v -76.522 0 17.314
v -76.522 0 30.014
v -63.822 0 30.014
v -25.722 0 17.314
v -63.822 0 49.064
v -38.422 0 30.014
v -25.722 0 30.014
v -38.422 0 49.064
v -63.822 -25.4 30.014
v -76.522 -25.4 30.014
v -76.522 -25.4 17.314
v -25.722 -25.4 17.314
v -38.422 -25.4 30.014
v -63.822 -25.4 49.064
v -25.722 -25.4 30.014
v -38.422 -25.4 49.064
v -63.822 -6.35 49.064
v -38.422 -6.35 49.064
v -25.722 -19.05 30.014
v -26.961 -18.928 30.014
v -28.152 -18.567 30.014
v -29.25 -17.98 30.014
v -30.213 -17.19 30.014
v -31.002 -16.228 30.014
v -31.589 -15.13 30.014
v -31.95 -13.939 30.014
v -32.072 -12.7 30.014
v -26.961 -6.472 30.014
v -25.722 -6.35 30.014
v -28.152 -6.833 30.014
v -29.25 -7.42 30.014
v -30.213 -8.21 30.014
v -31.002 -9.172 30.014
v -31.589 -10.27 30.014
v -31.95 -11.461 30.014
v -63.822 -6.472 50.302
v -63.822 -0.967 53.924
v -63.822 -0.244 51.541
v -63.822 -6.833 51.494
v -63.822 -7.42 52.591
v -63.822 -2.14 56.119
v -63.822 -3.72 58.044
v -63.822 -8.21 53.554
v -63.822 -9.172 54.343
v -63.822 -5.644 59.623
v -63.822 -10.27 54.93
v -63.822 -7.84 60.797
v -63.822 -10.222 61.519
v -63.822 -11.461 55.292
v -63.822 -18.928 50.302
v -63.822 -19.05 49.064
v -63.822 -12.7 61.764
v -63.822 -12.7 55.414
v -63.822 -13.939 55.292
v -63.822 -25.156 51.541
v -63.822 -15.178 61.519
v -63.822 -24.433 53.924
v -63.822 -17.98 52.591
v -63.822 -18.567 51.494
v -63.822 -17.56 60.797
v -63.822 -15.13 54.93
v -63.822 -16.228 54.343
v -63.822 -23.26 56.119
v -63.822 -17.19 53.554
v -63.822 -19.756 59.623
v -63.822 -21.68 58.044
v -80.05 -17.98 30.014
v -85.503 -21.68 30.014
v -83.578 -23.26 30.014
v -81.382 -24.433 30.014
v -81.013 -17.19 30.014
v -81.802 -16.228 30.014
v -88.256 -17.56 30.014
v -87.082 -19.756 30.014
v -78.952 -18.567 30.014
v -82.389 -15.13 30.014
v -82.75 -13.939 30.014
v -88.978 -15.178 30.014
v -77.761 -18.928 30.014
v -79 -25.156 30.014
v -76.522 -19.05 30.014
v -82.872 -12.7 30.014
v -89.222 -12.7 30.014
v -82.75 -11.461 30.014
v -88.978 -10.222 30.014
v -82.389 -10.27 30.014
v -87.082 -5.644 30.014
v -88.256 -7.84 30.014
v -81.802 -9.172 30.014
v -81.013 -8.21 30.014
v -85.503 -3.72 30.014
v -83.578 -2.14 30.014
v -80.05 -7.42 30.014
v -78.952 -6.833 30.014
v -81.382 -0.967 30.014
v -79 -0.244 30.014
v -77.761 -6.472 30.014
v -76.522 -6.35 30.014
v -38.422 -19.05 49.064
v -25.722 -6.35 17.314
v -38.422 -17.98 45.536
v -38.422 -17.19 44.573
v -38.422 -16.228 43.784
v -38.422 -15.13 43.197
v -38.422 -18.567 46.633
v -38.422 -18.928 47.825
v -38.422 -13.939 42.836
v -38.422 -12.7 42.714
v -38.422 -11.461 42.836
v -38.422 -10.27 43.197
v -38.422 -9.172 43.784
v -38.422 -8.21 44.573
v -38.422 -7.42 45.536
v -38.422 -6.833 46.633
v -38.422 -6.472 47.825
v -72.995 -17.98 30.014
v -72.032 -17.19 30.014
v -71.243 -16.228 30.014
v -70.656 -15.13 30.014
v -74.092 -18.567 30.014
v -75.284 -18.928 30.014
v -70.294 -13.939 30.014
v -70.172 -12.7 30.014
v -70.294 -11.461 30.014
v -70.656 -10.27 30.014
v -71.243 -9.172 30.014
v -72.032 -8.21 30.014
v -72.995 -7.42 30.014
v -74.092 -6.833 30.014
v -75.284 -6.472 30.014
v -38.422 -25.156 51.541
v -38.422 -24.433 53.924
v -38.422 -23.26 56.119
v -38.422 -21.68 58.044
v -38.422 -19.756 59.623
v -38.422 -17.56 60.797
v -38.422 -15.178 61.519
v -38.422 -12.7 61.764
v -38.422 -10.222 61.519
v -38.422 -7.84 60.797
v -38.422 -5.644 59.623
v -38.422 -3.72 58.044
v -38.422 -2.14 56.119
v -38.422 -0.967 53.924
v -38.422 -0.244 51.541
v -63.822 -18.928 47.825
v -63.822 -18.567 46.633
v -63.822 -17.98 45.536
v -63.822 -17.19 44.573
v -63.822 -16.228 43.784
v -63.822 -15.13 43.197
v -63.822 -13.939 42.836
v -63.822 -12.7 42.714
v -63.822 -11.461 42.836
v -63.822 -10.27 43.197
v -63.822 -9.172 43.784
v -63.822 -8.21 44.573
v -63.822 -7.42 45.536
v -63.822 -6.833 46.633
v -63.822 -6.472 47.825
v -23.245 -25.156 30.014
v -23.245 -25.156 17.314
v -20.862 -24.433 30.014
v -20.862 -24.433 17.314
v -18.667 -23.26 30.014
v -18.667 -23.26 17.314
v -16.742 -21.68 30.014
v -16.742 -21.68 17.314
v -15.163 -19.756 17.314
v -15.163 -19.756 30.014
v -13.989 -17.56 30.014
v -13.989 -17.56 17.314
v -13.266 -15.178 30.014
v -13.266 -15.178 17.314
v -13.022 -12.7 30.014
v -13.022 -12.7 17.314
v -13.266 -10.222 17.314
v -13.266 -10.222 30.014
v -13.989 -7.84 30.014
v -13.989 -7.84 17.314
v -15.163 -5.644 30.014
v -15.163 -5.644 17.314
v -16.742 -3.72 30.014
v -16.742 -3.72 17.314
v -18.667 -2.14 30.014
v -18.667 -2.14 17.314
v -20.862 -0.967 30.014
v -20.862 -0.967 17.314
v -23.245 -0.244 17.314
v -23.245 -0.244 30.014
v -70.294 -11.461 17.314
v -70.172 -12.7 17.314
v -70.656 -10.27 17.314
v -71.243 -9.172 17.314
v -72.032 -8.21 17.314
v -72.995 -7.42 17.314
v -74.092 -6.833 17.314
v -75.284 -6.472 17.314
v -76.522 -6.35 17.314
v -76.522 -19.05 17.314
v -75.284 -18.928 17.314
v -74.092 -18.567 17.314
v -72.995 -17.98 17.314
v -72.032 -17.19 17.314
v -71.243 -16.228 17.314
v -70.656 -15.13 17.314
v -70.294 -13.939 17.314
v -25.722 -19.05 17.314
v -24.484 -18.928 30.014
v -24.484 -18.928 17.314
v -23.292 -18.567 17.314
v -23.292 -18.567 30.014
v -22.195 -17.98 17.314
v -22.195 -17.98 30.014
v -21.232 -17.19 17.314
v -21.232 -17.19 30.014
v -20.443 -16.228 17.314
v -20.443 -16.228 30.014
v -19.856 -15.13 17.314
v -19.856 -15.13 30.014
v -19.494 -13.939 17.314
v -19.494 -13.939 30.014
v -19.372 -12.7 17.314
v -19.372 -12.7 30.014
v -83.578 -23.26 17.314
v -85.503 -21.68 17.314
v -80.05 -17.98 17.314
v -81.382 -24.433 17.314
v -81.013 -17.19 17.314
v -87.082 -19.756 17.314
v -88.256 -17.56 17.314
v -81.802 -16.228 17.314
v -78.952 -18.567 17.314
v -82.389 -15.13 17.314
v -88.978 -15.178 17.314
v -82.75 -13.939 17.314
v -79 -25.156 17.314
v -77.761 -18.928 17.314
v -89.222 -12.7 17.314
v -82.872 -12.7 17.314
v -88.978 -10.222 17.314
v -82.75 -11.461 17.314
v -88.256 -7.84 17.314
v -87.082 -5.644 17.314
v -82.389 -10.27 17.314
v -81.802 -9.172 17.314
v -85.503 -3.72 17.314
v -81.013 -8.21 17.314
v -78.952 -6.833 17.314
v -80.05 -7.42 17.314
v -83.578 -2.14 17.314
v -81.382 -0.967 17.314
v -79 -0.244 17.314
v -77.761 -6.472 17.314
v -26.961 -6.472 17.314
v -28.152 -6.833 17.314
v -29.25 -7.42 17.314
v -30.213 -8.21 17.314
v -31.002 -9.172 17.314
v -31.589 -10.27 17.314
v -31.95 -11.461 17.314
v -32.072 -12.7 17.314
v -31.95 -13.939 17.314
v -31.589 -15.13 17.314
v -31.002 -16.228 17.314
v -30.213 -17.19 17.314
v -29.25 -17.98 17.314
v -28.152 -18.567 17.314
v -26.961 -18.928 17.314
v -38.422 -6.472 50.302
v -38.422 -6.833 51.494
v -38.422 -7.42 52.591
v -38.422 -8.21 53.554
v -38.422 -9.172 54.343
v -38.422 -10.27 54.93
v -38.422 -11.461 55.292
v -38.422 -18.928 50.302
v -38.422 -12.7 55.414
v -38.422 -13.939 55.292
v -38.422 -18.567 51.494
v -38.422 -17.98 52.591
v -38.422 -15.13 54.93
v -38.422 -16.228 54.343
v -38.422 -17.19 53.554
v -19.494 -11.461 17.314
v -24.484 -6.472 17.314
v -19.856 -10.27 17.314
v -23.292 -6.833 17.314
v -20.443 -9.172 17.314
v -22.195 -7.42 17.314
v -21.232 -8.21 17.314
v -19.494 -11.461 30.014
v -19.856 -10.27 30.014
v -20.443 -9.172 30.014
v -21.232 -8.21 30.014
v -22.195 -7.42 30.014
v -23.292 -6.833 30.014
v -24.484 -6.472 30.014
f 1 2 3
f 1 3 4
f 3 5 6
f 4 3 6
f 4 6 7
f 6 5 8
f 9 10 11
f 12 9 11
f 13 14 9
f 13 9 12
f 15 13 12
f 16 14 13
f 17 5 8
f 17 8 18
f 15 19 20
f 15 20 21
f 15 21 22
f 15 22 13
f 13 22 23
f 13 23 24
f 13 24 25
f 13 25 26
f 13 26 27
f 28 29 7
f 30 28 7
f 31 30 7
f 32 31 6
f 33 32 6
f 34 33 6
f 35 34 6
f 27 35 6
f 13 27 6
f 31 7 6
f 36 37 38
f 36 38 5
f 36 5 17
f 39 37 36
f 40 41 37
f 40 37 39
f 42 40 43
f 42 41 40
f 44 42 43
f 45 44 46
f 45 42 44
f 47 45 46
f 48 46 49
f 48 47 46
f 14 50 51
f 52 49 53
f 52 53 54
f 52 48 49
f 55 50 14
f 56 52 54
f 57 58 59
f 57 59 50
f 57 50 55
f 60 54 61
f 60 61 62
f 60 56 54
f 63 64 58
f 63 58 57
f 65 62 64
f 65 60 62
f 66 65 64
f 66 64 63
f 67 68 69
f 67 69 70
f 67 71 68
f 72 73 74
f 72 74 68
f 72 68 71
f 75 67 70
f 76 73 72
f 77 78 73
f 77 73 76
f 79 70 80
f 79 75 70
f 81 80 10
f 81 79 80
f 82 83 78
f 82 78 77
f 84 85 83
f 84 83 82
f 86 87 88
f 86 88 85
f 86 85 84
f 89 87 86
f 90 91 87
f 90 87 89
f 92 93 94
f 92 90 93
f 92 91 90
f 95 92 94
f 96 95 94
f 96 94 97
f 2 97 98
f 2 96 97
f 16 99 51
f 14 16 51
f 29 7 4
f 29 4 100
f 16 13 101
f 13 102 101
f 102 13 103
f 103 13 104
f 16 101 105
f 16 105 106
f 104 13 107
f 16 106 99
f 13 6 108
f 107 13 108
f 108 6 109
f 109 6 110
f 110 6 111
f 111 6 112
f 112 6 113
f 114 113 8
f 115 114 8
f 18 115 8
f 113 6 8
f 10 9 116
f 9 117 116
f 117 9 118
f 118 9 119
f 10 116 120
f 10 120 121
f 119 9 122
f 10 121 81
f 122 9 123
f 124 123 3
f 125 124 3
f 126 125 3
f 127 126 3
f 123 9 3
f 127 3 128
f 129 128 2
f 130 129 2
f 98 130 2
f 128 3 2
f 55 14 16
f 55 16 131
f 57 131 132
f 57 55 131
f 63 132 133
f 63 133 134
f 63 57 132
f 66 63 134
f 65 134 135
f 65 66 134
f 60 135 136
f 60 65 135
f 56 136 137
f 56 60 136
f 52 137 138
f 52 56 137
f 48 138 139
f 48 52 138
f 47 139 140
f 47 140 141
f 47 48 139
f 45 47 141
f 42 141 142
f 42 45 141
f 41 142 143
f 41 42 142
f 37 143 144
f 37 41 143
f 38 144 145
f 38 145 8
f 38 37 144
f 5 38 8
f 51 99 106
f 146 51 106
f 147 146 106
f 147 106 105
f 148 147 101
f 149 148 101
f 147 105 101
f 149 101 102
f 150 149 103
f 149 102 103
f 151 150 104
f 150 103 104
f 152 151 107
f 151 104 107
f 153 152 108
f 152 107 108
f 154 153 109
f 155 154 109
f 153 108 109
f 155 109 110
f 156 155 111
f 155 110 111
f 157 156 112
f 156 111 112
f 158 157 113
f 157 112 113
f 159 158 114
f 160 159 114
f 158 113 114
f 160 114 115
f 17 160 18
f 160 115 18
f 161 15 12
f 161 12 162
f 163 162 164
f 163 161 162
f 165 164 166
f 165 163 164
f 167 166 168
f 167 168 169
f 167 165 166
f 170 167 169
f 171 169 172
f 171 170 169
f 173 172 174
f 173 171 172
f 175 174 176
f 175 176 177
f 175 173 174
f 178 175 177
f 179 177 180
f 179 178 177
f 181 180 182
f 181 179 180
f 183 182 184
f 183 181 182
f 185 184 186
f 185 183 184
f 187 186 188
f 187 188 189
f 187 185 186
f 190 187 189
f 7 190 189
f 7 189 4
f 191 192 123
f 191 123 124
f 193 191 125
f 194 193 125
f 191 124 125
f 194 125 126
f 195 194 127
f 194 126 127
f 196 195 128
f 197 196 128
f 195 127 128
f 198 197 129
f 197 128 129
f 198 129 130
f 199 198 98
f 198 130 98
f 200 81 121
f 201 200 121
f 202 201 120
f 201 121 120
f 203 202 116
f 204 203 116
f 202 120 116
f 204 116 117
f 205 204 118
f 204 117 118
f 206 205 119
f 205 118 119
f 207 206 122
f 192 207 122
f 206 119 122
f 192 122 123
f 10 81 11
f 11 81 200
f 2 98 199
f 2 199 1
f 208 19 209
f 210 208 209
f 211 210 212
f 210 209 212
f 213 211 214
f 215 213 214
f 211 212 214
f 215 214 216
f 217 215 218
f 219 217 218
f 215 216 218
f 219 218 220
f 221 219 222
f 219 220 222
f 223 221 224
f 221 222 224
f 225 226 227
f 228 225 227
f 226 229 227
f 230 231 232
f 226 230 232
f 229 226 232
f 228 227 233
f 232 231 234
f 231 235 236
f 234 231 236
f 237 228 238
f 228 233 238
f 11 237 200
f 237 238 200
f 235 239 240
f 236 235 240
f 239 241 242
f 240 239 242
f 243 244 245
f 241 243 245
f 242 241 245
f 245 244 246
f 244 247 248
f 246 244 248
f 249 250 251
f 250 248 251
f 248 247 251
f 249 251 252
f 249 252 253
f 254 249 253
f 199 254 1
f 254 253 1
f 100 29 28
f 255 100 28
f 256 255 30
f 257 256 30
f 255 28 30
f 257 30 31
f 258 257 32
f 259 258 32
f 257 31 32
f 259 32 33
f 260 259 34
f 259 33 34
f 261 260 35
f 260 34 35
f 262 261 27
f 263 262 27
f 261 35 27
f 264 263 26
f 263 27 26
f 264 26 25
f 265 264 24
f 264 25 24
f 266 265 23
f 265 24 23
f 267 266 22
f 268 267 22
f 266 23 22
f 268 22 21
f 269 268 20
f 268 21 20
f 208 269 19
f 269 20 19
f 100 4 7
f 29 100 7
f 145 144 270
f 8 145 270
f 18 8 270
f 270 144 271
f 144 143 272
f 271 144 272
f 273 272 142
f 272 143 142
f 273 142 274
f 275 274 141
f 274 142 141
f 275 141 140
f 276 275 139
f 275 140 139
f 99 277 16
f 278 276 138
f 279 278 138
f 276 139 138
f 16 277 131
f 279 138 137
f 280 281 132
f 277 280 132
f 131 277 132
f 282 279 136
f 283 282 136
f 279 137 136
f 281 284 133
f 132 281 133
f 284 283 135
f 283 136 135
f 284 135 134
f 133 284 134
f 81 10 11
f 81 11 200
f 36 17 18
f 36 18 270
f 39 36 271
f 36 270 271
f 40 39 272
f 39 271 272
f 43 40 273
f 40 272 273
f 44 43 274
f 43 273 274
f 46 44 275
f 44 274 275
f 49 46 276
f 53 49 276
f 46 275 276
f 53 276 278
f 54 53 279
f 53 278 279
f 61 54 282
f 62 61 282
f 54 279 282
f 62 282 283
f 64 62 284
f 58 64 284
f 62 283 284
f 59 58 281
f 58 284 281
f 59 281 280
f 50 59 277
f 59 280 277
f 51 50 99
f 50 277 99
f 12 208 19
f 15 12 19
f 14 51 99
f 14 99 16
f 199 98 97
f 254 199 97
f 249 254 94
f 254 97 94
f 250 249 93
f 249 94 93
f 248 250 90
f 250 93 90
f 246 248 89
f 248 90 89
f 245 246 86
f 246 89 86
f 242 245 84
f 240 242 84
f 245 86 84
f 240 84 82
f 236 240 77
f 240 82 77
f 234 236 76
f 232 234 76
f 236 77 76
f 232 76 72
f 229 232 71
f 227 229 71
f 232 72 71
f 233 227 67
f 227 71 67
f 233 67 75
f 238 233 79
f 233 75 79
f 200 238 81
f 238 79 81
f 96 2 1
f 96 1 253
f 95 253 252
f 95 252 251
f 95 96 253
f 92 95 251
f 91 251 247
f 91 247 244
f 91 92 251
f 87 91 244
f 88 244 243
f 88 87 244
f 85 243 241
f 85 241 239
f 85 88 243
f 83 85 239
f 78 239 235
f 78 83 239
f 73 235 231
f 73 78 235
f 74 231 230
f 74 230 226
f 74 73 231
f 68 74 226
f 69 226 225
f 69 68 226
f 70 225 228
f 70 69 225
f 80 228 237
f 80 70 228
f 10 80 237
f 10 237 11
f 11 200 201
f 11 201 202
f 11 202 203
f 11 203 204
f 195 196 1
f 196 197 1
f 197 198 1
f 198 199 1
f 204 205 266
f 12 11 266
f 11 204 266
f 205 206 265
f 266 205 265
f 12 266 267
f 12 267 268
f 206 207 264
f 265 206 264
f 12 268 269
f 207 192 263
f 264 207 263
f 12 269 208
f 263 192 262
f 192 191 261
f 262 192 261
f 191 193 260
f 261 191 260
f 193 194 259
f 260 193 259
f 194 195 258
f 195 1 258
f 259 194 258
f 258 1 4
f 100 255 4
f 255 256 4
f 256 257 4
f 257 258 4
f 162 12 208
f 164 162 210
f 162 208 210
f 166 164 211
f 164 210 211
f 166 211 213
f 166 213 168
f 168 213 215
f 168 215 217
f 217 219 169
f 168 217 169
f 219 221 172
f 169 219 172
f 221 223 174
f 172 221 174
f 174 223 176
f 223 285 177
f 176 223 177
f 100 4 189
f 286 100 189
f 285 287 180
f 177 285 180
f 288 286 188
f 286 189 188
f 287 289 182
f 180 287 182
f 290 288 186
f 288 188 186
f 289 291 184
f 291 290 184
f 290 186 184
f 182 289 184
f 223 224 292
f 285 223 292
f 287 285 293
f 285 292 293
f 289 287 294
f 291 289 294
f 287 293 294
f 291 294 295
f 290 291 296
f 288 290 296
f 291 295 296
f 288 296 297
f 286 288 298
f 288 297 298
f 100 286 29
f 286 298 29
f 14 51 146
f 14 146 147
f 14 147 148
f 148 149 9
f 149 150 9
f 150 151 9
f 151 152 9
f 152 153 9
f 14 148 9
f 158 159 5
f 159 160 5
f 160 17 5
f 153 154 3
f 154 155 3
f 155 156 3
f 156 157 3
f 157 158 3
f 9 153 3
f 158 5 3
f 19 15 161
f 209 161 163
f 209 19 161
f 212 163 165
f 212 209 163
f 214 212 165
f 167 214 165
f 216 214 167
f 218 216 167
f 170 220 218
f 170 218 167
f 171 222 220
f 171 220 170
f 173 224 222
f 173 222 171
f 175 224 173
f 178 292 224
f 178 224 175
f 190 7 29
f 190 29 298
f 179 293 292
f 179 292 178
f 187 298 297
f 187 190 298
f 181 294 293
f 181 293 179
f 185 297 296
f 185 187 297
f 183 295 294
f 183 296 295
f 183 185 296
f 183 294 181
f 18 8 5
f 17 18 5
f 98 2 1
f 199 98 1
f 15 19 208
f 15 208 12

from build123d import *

# Parameters (mm, degrees)
F1_DEPTH  = 25.4
F3_DEPTH  = 25.4
F5_DEPTH  = 25.4
F7_DEPTH  = 25.4
F9_DEPTH  = 12.7
F11_DEPTH = 12.7
F13_DEPTH = 12.7
F15_DEPTH = 12.7
F17_DEPTH = 12.7
F19_DEPTH = 12.7


with BuildPart() as f1:
    # F0 (on Front) → F1 (new body)
    with BuildSketch(Plane.XZ):
        Polygon((-63.8223838828, 30.0135200279), (-76.5223838828, 30.0135200279), (-76.5223838828, 17.3135200279), (-25.7223838828, 17.3135200279), (-25.7223838828, 30.0135200279), (-38.4223838828, 30.0135200279), (-38.4223838828, 49.0635200279), (-63.8223838828, 49.0635200279), align=None)
    extrude(amount=F1_DEPTH)

    # F6 (on face) → F7 (cut)
    with BuildSketch(Plane.YZ.offset(-38.4223838828)):
        with BuildLine():
            ThreePointArc((-19.05, 49.0635200279), (-12.7, 42.7135200279), (-6.35, 49.0635200279))
            Line((-6.35, 49.0635200279), (-19.05, 49.0635200279))
        make_face()
    extrude(amount=-F7_DEPTH, mode=Mode.SUBTRACT)

    # F14 (on face) → F15 (cut)
    with BuildSketch(Plane.XY.offset(30.0135200279)):
        with BuildLine():
            Line((-25.7223838828, -19.05), (-25.7223838828, -6.35))
            ThreePointArc((-25.7223838828, -6.35), (-32.0723838828, -12.7), (-25.7223838828, -19.05))
        make_face()
    extrude(amount=-F15_DEPTH, mode=Mode.SUBTRACT)

    # F18 (on face) → F19 (cut)
    with BuildSketch(Plane.XY.offset(30.0135200279)):
        with BuildLine():
            ThreePointArc((-76.5223838828, -19.05), (-72.0322558223, -17.1901280605), (-70.1723838828, -12.7))
            ThreePointArc((-70.1723838828, -12.7), (-72.0322558223, -8.2098719395), (-76.5223838828, -6.35))
            Line((-76.5223838828, -6.35), (-76.5223838828, -19.05))
        make_face()
    extrude(amount=-F19_DEPTH, mode=Mode.SUBTRACT)


with BuildPart() as f3:
    # F2 (on face) → F3 (new body)
    with BuildSketch(Plane(origin=(-63.8223838828, 0, 0), x_dir=(0, -1, 0), z_dir=(-1, 0, 0))):
        with BuildLine():
            Line((0, 49.0635200279), (25.4, 49.0635200279))
            ThreePointArc((25.4, 49.0635200279), (12.7, 61.7635200279), (0, 49.0635200279))
        make_face()
    extrude(amount=-F3_DEPTH)

    # F4 (on face) → F5 (cut)
    with BuildSketch(Plane.YZ.offset(-38.4223838828)):
        with BuildLine():
            Line((-19.05, 49.0635200279), (-6.35, 49.0635200279))
            ThreePointArc((-6.35, 49.0635200279), (-12.7, 55.4135200279), (-19.05, 49.0635200279))
        make_face()
    extrude(amount=-F5_DEPTH, mode=Mode.SUBTRACT)


with BuildPart() as f9:
    # F8 (on face) → F9 (new body)
    with BuildSketch(Plane.XY.offset(30.0135200279)):
        with BuildLine():
            Line((-25.7223838828, 0), (-25.7223838828, -25.4))
            ThreePointArc((-25.7223838828, -25.4), (-13.0223838828, -12.7), (-25.7223838828, 0))
        make_face()
    extrude(amount=-F9_DEPTH)

    # F12 (on face) → F13 (cut)
    with BuildSketch(Plane.XY.offset(30.0135200279)):
        with BuildLine():
            ThreePointArc((-25.7223838828, -19.05), (-21.2322558223, -17.1901280605), (-19.3723838828, -12.7))
            ThreePointArc((-19.3723838828, -12.7), (-21.2322558223, -8.2098719395), (-25.7223838828, -6.35))
            Line((-25.7223838828, -6.35), (-25.7223838828, -19.05))
        make_face()
    extrude(amount=-F13_DEPTH, mode=Mode.SUBTRACT)


with BuildPart() as f11:
    # F10 (on face) → F11 (new body)
    with BuildSketch(Plane.XY.offset(30.0135200279)):
        with BuildLine():
            Line((-76.5223838828, -25.4), (-76.5223838828, 0))
            ThreePointArc((-76.5223838828, 0), (-89.2223838828, -12.7), (-76.5223838828, -25.4))
        make_face()
    extrude(amount=-F11_DEPTH)

    # F16 (on face) → F17 (cut)
    with BuildSketch(Plane.XY.offset(30.0135200279)):
        with BuildLine():
            Line((-76.5223838828, -19.05), (-76.5223838828, -6.35))
            ThreePointArc((-76.5223838828, -6.35), (-82.8723838828, -12.7), (-76.5223838828, -19.05))
        make_face()
    extrude(amount=-F17_DEPTH, mode=Mode.SUBTRACT)


solid = Compound([f1.part, f3.part, f9.part, f11.part])
